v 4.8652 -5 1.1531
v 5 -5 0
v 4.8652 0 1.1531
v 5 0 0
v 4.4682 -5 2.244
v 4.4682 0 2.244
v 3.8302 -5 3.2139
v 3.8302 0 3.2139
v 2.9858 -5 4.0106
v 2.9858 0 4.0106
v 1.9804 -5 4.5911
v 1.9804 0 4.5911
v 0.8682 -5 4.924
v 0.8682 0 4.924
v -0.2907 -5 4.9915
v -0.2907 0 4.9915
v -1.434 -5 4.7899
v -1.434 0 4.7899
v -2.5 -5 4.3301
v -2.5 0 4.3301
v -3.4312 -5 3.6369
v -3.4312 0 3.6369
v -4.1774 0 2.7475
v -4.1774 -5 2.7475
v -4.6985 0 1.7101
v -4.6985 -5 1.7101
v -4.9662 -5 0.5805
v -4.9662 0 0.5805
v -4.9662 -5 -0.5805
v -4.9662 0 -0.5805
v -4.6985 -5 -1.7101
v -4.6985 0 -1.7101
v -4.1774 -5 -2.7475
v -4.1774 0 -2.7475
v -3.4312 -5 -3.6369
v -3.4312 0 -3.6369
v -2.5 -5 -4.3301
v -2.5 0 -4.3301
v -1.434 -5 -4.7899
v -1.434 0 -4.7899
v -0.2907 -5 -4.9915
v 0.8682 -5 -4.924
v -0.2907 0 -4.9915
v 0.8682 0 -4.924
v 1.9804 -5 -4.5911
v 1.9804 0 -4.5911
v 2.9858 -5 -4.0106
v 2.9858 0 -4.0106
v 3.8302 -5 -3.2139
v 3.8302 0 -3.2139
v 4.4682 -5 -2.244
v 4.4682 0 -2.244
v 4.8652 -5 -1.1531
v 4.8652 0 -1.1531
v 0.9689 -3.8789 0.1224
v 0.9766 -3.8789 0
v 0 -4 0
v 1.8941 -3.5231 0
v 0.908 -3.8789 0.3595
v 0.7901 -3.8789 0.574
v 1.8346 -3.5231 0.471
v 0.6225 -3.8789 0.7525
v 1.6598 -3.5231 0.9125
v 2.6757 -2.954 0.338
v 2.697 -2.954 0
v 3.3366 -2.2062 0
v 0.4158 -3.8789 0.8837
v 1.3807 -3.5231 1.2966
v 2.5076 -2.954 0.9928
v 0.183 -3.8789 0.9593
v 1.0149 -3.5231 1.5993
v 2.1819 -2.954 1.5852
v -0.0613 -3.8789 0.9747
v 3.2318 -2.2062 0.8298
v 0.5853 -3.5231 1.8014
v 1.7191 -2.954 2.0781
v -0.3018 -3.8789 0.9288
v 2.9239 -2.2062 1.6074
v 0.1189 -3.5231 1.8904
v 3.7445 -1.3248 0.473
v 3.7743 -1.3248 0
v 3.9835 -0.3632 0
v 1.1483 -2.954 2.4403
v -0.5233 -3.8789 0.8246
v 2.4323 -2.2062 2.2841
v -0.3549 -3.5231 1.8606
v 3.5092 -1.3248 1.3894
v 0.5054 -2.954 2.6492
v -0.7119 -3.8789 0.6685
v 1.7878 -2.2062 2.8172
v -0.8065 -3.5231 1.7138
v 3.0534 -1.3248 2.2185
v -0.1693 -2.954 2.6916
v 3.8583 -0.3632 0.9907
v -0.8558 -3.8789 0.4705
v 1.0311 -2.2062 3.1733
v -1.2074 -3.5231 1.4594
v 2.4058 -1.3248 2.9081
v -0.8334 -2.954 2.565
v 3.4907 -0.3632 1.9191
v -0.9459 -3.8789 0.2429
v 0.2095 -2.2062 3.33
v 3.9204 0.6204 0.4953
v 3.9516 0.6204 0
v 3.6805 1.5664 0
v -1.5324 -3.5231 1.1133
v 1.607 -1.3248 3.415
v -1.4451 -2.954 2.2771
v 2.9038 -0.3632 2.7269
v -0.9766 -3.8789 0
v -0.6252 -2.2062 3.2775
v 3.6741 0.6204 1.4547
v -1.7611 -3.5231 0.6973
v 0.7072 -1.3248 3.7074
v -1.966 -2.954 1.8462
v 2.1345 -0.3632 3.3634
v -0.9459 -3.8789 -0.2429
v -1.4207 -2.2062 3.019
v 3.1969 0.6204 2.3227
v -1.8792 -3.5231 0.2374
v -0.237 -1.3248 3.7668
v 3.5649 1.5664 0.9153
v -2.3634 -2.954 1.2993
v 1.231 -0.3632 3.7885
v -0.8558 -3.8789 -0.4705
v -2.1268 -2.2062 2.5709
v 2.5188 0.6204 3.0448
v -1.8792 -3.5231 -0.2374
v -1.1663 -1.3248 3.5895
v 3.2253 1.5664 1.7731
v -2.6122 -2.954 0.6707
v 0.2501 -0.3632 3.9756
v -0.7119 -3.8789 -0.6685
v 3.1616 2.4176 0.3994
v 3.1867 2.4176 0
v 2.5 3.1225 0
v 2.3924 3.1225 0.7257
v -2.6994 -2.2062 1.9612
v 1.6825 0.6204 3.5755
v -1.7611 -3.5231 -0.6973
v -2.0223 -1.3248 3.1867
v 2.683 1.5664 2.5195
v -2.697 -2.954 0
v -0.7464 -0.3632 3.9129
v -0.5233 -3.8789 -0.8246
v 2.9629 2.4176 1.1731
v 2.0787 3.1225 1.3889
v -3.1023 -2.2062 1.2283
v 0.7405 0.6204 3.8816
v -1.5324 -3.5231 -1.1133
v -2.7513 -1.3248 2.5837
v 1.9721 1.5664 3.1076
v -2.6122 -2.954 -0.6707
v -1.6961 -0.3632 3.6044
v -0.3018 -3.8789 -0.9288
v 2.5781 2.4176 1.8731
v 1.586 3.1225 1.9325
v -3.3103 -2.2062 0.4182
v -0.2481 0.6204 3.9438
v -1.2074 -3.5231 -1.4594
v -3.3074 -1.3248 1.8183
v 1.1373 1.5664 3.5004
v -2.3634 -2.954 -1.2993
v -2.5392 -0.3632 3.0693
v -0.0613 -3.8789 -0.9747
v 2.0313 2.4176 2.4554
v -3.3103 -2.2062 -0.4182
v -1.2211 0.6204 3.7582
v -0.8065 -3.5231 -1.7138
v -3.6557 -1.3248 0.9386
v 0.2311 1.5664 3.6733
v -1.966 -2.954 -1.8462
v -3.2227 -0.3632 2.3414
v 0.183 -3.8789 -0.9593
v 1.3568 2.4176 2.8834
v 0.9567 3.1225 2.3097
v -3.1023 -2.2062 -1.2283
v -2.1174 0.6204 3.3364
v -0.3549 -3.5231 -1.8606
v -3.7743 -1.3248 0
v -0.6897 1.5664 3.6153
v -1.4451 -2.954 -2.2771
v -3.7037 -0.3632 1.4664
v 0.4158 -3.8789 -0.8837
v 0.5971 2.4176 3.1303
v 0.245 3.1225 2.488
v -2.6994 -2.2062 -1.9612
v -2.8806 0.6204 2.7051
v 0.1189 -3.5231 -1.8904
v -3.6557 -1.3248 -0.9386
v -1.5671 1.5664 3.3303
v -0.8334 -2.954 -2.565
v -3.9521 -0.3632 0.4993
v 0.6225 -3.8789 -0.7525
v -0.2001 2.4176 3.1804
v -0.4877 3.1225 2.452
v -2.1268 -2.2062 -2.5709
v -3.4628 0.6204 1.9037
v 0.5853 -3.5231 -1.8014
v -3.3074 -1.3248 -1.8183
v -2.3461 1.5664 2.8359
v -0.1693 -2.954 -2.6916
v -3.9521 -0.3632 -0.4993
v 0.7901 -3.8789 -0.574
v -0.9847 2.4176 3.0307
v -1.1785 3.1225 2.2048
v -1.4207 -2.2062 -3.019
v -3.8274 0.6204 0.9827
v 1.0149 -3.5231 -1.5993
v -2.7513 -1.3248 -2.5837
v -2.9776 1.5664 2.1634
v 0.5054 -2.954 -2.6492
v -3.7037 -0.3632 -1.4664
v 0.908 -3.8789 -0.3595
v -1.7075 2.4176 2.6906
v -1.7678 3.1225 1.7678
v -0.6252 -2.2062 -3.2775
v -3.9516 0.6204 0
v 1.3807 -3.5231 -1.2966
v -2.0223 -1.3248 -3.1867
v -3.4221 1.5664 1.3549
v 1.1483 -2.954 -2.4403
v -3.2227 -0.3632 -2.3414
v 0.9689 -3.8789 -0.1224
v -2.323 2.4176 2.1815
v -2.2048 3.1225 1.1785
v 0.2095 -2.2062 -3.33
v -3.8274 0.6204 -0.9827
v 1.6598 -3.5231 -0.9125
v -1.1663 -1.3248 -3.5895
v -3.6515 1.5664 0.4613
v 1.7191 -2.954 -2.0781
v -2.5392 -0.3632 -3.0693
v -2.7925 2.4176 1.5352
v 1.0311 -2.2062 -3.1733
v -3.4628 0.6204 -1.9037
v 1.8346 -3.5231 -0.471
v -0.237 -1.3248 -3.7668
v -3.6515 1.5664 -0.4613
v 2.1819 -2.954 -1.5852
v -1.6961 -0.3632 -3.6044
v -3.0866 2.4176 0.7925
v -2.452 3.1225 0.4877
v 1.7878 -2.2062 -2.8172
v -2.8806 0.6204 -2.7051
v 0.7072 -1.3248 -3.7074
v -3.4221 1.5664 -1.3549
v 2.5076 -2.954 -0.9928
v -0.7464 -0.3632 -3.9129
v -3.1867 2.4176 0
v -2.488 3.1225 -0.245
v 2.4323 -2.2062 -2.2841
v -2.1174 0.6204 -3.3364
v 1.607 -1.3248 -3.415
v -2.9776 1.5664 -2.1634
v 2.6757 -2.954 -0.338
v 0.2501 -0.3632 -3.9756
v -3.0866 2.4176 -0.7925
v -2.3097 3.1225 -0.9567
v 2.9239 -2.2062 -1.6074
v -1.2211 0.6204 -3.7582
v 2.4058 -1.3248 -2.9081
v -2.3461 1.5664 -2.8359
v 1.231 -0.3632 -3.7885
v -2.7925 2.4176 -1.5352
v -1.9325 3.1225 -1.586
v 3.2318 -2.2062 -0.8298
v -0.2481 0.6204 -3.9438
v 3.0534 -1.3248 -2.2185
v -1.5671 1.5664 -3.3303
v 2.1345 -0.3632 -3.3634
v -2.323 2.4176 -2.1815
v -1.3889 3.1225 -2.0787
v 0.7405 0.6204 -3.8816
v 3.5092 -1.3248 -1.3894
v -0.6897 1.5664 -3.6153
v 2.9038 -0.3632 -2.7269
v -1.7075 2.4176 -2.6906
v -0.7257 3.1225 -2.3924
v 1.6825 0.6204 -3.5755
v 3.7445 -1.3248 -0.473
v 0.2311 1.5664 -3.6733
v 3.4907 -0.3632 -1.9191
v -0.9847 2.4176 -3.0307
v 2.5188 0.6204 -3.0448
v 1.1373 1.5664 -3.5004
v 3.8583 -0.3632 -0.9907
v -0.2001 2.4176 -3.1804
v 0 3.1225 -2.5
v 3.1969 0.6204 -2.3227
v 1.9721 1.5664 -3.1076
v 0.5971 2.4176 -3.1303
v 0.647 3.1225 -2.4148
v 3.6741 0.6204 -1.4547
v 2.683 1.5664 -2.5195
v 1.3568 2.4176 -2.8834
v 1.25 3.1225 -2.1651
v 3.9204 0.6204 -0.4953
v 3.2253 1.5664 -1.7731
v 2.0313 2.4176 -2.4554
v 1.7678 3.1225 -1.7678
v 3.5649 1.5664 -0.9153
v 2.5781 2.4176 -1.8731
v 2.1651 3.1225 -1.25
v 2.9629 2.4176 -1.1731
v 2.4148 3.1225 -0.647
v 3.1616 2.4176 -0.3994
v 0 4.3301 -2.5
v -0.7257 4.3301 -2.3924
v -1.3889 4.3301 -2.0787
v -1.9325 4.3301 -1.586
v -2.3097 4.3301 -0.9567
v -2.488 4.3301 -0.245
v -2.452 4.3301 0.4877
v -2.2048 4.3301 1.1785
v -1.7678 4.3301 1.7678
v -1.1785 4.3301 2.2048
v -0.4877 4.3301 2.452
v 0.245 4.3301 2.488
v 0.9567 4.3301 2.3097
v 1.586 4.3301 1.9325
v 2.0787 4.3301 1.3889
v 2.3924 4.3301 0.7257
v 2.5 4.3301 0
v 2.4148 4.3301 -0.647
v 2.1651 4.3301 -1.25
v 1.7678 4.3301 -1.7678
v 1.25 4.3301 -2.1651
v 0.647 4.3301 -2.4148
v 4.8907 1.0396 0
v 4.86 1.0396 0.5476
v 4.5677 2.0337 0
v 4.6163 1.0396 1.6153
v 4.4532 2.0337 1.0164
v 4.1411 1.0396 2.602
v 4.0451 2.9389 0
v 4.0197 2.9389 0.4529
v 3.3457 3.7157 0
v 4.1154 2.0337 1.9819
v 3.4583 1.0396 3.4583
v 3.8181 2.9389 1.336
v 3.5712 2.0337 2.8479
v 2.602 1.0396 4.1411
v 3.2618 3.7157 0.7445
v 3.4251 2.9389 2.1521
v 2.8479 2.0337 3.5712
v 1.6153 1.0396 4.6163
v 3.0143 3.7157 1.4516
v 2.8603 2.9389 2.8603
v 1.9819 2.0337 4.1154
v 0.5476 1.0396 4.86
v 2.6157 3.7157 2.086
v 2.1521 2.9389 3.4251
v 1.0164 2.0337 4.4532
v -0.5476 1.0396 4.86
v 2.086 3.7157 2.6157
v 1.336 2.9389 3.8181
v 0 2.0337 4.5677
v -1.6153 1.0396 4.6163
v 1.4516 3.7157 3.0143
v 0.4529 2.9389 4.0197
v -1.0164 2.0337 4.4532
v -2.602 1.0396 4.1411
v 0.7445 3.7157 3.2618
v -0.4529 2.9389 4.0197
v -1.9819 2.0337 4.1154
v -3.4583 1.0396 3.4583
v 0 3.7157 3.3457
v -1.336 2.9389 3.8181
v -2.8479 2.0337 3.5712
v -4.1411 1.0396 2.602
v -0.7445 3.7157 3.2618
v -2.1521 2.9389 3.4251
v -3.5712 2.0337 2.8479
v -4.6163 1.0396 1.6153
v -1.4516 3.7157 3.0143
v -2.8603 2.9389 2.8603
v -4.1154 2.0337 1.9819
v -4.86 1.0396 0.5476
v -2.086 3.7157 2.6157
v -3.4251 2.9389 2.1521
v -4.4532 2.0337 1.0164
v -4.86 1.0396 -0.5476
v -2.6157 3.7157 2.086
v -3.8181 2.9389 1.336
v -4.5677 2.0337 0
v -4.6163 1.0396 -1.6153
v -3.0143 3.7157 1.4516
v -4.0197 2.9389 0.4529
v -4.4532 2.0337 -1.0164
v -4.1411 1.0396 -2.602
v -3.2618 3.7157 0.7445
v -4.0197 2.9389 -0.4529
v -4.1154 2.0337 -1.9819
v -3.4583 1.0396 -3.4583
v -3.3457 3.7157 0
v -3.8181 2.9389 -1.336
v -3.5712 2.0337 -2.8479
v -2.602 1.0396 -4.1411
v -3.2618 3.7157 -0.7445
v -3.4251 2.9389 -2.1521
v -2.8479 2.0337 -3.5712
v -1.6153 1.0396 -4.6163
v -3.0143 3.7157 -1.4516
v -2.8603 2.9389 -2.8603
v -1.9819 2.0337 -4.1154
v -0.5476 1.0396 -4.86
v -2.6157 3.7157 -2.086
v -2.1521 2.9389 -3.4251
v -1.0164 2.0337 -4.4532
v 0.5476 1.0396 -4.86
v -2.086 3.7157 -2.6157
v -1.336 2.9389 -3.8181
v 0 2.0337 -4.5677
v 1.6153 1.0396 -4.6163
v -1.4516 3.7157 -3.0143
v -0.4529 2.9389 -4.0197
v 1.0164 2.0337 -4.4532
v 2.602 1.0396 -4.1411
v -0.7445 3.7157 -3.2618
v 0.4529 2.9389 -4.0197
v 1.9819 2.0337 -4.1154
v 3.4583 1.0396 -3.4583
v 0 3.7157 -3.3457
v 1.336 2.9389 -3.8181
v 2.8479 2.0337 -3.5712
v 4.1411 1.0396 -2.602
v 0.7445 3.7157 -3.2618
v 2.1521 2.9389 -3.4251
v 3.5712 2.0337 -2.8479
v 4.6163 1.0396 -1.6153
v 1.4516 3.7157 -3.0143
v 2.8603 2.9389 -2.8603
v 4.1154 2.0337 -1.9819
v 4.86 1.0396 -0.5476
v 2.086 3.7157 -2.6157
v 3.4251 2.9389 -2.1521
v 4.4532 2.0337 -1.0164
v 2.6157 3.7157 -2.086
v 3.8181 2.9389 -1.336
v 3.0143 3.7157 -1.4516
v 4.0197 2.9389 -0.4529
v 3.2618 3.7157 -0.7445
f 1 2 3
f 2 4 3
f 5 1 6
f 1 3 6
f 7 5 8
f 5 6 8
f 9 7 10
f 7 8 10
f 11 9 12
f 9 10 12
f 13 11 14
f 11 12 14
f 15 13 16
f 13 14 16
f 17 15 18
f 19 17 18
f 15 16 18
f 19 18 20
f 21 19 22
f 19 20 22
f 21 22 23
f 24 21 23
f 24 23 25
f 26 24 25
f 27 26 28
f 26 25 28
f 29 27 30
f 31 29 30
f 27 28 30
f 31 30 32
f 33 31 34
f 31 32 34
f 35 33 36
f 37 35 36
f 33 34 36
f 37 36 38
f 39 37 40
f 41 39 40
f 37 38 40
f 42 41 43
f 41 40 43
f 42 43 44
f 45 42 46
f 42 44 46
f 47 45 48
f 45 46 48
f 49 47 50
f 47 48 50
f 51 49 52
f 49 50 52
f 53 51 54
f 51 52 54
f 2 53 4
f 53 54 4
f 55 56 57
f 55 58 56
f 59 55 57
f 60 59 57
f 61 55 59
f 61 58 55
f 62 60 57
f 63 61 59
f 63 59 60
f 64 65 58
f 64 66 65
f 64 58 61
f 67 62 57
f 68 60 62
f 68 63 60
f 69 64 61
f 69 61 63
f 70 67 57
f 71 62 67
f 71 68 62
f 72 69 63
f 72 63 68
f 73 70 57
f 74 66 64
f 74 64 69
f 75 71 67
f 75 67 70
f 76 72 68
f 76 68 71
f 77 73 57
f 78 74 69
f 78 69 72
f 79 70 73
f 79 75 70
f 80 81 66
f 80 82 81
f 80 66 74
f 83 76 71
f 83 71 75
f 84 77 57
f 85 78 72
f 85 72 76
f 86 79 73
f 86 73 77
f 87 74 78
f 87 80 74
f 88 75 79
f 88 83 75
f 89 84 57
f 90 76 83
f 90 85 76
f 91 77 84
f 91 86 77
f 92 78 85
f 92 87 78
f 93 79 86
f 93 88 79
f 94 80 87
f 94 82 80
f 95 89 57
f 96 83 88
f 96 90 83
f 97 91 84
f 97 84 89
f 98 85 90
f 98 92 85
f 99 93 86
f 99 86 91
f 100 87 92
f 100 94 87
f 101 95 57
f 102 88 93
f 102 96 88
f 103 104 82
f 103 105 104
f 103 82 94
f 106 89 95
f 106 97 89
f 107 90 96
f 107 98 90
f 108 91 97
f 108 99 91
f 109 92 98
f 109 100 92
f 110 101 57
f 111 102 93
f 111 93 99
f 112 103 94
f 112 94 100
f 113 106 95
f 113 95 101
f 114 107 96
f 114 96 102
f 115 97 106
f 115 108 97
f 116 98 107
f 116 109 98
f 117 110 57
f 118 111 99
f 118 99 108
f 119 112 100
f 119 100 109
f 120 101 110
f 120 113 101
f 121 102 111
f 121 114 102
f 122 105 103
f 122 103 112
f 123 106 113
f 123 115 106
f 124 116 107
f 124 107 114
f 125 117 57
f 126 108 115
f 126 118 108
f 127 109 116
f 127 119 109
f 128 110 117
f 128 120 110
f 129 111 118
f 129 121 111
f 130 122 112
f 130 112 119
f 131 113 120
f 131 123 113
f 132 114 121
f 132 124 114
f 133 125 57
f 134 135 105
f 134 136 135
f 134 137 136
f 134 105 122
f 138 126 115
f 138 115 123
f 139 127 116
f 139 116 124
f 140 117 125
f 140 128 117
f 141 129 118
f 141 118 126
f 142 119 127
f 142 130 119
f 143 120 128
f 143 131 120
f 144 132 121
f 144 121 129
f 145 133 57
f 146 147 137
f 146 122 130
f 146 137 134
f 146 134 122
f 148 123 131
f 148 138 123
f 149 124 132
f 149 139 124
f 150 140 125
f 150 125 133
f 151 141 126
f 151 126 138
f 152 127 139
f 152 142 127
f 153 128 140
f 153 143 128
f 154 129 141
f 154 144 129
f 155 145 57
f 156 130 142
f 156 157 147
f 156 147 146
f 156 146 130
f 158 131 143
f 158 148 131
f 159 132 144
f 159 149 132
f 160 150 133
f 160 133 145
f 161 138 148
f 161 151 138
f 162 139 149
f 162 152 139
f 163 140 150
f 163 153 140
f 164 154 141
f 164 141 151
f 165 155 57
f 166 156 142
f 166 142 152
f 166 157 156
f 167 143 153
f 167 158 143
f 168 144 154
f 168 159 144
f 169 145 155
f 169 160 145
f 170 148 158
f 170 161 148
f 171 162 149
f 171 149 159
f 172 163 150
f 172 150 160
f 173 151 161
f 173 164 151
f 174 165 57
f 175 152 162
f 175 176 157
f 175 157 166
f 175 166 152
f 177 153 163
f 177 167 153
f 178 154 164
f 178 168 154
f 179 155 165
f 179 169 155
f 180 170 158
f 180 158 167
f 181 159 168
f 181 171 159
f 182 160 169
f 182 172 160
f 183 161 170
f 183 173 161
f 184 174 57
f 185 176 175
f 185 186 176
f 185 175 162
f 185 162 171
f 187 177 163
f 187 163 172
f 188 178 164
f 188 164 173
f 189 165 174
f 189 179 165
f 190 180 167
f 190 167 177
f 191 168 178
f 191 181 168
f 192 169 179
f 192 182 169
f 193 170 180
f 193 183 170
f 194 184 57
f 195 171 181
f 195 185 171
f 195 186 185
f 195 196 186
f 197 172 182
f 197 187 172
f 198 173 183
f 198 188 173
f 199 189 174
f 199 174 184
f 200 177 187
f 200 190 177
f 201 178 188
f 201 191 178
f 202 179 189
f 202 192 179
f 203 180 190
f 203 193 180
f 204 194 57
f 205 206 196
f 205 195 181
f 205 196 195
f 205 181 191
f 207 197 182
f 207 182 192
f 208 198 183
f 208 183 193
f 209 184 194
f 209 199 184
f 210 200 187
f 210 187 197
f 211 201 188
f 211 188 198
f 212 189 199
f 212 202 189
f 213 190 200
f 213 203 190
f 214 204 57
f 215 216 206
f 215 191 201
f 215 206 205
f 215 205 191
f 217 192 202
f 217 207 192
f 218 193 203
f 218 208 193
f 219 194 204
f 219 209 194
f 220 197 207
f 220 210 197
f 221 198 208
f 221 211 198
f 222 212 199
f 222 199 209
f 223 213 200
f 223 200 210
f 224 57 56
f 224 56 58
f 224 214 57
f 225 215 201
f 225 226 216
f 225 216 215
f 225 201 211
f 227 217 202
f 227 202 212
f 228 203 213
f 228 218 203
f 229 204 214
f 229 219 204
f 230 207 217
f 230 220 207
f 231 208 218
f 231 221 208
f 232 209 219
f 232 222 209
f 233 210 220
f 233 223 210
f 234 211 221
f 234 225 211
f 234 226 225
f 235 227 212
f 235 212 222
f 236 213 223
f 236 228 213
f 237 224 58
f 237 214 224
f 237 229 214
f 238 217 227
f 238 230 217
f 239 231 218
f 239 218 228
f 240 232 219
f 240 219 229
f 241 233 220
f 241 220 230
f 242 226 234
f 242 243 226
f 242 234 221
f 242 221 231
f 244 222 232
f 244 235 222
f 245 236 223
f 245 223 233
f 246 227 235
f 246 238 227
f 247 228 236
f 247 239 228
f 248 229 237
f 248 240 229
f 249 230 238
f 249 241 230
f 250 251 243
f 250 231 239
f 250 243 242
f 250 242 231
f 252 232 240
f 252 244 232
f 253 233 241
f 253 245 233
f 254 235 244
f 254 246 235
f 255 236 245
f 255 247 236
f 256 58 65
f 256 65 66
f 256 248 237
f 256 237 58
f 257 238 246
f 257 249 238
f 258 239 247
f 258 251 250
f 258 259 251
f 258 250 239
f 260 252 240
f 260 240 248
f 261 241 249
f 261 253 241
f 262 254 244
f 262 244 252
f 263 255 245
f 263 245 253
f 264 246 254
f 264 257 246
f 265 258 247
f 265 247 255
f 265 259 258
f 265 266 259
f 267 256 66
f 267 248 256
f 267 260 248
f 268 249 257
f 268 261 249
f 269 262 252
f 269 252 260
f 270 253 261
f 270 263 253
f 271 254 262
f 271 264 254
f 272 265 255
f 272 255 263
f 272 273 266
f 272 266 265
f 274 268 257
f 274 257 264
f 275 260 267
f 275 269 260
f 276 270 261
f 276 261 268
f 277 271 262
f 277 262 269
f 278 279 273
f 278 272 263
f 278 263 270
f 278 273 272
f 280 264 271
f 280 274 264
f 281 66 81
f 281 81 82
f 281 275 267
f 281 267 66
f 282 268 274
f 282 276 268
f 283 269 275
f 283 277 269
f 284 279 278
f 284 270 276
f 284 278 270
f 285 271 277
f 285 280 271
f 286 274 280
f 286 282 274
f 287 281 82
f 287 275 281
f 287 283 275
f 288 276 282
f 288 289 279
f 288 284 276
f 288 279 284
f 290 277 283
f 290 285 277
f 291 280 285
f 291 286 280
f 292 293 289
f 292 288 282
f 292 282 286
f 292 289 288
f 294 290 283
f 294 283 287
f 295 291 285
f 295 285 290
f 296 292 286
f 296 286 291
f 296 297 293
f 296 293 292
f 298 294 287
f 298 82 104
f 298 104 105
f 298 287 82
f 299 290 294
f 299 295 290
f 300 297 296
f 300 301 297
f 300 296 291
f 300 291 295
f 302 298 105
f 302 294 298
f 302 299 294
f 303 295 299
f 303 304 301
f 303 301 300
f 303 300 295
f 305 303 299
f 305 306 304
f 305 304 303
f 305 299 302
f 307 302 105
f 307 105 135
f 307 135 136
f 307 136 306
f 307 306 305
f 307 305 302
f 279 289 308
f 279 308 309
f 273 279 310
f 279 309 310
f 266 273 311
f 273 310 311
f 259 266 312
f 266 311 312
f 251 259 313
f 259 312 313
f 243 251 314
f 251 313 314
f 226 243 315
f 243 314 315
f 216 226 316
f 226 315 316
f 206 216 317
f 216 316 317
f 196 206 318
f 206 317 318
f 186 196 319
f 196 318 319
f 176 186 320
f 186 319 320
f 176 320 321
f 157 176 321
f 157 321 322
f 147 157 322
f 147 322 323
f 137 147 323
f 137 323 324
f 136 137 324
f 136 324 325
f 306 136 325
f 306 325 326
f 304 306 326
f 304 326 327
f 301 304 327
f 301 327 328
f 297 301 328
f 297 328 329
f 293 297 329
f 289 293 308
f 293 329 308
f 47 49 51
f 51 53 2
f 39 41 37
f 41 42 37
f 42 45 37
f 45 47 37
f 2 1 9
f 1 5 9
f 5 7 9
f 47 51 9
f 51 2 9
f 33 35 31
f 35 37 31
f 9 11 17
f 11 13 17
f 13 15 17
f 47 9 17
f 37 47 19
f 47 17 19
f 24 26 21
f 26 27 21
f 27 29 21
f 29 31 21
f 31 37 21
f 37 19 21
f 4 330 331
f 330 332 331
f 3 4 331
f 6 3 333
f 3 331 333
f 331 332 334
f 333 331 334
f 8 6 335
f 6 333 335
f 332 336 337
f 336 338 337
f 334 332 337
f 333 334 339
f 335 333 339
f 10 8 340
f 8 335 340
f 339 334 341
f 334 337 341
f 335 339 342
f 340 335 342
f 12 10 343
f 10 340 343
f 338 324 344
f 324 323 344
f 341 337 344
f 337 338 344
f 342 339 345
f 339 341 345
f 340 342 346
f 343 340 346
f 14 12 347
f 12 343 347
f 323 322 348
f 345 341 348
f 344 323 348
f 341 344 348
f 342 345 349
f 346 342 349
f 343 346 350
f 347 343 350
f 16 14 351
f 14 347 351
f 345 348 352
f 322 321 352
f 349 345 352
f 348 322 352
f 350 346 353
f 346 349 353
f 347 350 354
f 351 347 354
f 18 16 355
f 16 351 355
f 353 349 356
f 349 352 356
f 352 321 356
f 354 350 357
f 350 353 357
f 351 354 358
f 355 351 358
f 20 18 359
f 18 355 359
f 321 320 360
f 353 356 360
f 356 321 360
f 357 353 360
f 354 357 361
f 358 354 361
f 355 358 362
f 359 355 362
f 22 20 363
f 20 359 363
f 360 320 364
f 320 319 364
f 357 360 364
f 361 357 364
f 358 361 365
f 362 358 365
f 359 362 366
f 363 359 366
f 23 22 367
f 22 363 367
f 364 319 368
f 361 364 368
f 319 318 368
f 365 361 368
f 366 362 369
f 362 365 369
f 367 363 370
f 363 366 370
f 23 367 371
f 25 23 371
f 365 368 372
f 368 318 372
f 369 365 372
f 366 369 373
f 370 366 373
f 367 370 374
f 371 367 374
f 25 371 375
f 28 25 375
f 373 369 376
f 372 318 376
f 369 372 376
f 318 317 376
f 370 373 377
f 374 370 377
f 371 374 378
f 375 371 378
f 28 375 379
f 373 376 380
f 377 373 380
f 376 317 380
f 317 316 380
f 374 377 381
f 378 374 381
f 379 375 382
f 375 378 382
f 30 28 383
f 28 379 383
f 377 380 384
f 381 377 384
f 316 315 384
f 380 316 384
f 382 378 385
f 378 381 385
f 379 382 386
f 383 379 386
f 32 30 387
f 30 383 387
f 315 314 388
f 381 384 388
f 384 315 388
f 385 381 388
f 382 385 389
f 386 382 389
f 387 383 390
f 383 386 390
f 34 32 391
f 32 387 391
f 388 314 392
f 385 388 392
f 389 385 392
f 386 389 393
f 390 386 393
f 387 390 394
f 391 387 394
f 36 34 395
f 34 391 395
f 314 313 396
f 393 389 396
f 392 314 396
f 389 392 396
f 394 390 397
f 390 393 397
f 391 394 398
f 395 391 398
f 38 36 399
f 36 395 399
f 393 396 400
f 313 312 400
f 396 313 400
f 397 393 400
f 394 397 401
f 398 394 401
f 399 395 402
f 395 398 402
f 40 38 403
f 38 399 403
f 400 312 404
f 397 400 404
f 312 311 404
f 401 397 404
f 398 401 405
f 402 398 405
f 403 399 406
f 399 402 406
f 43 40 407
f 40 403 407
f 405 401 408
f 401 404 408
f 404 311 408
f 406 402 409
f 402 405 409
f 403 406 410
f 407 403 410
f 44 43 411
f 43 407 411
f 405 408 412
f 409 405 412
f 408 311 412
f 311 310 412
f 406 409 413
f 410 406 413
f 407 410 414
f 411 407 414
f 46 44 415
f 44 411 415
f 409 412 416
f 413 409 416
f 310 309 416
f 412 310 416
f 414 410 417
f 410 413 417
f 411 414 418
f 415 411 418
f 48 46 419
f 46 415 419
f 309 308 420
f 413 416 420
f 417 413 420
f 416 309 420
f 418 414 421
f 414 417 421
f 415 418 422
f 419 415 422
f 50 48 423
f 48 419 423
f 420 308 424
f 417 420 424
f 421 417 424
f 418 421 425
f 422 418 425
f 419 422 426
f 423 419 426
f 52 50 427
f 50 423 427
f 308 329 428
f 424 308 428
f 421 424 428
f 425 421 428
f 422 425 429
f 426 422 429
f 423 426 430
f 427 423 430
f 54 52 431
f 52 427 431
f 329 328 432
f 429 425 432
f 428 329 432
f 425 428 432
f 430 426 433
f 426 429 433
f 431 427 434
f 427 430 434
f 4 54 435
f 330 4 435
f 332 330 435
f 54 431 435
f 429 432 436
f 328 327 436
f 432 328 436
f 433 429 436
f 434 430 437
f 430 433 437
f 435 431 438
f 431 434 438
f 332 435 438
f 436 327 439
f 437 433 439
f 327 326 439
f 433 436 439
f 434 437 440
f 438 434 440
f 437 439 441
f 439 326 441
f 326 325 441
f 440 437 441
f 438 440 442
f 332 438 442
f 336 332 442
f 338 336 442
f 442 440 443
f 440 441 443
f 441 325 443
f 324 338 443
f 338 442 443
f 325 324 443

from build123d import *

# Parameters (mm, degrees)
SKETCH3_R          = 2.5
CUT_EXTRUDE1_DEPTH = 3


with BuildPart() as part:
    # Sketch1 → Revolve2 (revolve)
    with BuildSketch(Plane.XY):
        with BuildLine():
            ThreePointArc((0, -5), (5, 0), (0, 5))
            Line((0, 5), (0, -5))
        make_face()
        with BuildLine():
            ThreePointArc((5, 0), (3.535533906, -3.535533906), (0, -5))
            Line((0, -5), (5, -5))
            Line((5, -5), (5, 0))
        make_face()
    revolve(axis=Axis((0, 5, 0), (0, -1, 0)))

    # Sketch2 → Cut-Revolve1 (revolve, cut)
    with BuildSketch(Plane.XY):
        with BuildLine():
            Line((0, 4), (0, -4))
            ThreePointArc((0, -4), (4, 0), (0, 4))
        make_face()
    revolve(axis=Axis((0, 4, 0), (0, -1, 0)), mode=Mode.SUBTRACT)

    # Sketch3 → Cut-Extrude1 (cut)
    with BuildSketch(Plane(origin=(0, 5, 0), x_dir=(1, 0, 0), z_dir=(0, 1, 0))):
        with Locations(Location((0, 0, 0), (0, 0, 90))):
            Circle(SKETCH3_R)
    extrude(amount=-CUT_EXTRUDE1_DEPTH, mode=Mode.SUBTRACT)


solid = part.part
